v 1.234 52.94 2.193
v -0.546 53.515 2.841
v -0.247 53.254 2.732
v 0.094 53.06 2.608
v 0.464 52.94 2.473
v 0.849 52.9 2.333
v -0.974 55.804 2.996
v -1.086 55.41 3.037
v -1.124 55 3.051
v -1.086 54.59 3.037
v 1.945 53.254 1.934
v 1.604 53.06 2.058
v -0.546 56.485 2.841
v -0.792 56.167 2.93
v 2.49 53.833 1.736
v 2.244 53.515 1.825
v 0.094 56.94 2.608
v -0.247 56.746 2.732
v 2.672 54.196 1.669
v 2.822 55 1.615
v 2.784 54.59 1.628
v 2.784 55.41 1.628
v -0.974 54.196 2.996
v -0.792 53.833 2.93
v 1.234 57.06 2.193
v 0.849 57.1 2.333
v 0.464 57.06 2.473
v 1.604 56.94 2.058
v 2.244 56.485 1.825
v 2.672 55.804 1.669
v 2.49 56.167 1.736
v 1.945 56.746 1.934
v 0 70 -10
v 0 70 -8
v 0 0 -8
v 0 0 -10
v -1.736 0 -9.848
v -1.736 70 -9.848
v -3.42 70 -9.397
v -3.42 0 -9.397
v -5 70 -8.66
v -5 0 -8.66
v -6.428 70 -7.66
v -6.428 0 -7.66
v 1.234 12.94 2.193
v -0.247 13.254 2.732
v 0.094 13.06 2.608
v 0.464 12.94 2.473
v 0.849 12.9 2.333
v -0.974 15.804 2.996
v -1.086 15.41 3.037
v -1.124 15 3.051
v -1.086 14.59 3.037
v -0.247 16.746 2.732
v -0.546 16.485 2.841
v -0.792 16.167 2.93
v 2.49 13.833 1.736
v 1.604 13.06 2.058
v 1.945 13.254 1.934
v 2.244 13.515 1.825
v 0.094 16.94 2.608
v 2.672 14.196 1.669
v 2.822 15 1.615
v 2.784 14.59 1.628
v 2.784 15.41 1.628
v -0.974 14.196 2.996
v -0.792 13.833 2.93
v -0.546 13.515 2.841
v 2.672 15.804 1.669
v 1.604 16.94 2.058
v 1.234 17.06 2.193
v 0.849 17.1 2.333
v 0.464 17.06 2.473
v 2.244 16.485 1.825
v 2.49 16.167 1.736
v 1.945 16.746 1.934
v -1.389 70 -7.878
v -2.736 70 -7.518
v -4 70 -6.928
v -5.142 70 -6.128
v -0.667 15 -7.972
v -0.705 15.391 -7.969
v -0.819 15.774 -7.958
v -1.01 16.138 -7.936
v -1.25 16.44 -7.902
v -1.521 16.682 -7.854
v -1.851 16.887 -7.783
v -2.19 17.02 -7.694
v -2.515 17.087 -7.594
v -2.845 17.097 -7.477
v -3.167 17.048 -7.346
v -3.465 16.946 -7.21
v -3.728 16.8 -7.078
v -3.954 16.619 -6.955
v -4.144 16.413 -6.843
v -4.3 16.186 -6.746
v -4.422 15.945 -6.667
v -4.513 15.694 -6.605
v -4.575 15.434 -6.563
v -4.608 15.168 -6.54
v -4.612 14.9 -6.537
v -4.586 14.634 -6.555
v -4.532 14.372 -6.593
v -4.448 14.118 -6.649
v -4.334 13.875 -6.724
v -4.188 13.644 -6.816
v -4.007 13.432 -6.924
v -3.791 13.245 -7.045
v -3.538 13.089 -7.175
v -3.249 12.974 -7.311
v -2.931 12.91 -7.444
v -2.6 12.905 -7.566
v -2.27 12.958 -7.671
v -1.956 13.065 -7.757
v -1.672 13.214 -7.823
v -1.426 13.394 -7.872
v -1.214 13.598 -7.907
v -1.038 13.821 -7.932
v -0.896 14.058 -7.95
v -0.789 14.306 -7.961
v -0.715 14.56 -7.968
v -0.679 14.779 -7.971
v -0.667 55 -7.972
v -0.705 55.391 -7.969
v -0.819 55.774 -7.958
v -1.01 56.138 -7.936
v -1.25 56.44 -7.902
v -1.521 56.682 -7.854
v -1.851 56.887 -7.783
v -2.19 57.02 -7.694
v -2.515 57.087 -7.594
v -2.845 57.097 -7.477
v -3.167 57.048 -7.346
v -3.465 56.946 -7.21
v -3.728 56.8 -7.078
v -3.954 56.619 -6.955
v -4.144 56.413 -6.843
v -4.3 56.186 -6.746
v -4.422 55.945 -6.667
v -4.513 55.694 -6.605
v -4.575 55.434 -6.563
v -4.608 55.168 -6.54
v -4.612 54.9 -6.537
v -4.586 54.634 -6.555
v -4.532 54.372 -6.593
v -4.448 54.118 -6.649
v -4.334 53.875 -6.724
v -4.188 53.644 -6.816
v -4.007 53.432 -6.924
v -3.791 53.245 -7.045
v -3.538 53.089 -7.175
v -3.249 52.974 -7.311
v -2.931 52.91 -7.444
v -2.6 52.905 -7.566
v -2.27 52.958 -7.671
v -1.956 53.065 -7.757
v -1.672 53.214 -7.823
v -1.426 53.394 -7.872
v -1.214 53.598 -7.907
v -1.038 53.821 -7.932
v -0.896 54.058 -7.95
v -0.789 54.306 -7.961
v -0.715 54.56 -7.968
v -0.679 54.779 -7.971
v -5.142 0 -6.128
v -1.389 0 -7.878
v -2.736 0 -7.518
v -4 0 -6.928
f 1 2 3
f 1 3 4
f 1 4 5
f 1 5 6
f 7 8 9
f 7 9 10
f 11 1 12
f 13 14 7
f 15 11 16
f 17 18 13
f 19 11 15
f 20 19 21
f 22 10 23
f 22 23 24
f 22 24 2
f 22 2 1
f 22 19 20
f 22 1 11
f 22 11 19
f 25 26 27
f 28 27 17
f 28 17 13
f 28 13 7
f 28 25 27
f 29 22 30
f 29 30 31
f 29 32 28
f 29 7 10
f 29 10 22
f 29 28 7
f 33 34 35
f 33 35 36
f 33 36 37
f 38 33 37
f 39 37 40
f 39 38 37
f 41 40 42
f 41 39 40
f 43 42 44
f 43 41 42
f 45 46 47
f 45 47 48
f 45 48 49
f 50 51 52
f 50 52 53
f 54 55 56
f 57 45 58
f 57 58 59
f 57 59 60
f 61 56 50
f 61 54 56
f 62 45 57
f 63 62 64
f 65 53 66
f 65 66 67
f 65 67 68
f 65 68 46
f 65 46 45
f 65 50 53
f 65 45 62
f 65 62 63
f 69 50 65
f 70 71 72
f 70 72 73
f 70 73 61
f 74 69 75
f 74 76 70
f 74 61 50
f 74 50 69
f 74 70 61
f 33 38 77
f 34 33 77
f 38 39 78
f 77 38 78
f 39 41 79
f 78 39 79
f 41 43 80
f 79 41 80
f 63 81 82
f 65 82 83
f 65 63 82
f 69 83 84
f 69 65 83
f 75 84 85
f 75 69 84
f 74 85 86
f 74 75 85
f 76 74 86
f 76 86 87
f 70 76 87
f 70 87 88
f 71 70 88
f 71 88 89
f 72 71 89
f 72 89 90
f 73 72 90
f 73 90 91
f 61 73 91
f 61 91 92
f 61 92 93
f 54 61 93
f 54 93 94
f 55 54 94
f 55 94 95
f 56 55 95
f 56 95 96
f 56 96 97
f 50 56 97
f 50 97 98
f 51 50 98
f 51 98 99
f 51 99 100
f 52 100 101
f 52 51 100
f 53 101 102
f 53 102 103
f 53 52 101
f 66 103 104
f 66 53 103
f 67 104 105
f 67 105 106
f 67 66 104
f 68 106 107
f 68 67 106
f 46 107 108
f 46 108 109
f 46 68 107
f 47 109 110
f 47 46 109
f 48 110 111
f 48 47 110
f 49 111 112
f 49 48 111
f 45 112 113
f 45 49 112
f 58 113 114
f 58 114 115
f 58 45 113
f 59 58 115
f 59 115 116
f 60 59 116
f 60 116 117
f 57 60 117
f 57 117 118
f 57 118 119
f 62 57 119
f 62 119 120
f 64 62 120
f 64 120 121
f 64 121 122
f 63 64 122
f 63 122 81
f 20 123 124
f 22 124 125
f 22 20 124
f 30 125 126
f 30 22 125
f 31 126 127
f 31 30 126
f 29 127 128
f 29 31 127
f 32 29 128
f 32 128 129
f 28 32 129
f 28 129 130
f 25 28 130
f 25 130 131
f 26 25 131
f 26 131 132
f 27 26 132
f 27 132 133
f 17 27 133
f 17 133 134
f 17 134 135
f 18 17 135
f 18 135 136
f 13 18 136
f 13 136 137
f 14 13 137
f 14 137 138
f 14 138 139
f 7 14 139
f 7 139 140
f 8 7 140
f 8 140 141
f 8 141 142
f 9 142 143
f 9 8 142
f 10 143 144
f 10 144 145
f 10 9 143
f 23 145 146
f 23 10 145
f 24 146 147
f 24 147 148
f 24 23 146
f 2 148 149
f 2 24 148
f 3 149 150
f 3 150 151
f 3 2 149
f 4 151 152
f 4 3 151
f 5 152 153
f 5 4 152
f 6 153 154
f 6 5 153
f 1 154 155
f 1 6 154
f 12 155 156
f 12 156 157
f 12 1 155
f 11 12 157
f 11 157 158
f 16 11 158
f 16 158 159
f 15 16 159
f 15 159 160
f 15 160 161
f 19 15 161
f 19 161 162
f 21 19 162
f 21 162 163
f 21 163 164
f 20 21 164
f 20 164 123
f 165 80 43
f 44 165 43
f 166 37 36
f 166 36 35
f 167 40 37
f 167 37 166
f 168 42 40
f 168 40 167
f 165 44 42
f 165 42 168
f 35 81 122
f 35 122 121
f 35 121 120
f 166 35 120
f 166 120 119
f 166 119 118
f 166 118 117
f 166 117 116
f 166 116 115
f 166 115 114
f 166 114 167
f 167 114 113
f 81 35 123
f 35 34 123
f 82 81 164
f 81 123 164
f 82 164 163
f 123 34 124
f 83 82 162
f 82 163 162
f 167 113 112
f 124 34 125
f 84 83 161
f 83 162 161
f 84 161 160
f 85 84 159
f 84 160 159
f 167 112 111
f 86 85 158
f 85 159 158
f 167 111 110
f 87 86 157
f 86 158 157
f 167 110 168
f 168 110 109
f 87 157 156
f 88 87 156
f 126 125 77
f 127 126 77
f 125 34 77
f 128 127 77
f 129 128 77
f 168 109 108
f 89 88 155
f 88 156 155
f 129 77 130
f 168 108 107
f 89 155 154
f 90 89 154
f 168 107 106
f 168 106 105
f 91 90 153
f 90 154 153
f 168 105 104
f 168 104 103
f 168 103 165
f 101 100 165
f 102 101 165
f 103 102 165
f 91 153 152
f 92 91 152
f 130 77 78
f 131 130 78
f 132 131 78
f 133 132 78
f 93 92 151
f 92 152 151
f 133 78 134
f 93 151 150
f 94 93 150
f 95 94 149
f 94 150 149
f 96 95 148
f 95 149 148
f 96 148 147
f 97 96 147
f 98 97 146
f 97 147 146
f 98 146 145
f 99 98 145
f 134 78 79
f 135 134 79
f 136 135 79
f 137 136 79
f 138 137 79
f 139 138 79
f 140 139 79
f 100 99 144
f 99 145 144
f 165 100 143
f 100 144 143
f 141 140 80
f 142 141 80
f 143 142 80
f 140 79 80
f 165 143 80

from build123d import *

# Parameters (mm, degrees)
SKETCH1_W                = 10
SKETCH1_H                = 70
REVOLVE1_ANGLE           = 40
CUT_EXTRUDE1_DEPTH       = 72.002236522
BOSS_EXTRUDE1_REACH      = 73.45
BOSS_EXTRUDE1_END_RADIUS = 8
SKETCH4_R                = 2.1


with BuildPart() as part:
    # Sketch1 → Revolve1 (revolve)
    with BuildSketch(Plane(origin=(0, 0, 0), x_dir=(0, 0, -1), z_dir=(1, 0, 0))):
        with Locations((5, 35)):
            Rectangle(SKETCH1_W, SKETCH1_H)
    revolve(axis=Axis((0, 0, 0), (0, 1, 0)), revolution_arc=REVOLVE1_ANGLE)

    # Sketch2 → Cut-Extrude1 (cut, through all)
    with BuildSketch(Plane(origin=(0, 70, 0), x_dir=(1, 0, 0), z_dir=(0, 1, 0))):
        with BuildLine():
            Line((-5.142300877, 6.128355545), (0, 0))
            Line((0, 0), (0, 8))
            ThreePointArc((0, 8), (-2.736161147, 7.517540966), (-5.142300877, 6.128355545))
        make_face()
    extrude(amount=-CUT_EXTRUDE1_DEPTH, mode=Mode.SUBTRACT)

    # Boss-Extrude1: up to this cylinder (the profile starts inside it)
    boss_extrude1_end = Plane(origin=(0, 35, 0), z_dir=(0, 1, 0)) * Cylinder(BOSS_EXTRUDE1_END_RADIUS, 203.9, mode=Mode.PRIVATE)
    # Sketch4 → Boss-Extrude1 (add, up to the surface)
    with BuildSketch(Plane(origin=(0.849050995, 0, 2.332748435), x_dir=(0.9396926207859081, 0, -0.34202014332566977), z_dir=(0.34202014332566977, 0, 0.9396926207859081)), mode=Mode.PRIVATE) as boss_extrude1_sk1:
        with Locations((0, 55)):
            Circle(SKETCH4_R)
    boss_extrude1_tool1 = extrude(boss_extrude1_sk1.sketch, amount=-BOSS_EXTRUDE1_REACH, mode=Mode.PRIVATE) & boss_extrude1_end
    add(boss_extrude1_tool1.solids().sort_by_distance((0.849051, 55, 2.332748))[0])
    # Sketch4 → Boss-Extrude1 (add, up to the surface)
    with BuildSketch(Plane(origin=(0.849050995, 0, 2.332748435), x_dir=(0.9396926207859081, 0, -0.34202014332566977), z_dir=(0.34202014332566977, 0, 0.9396926207859081)), mode=Mode.PRIVATE) as boss_extrude1_sk2:
        with Locations((0, 15)):
            Circle(SKETCH4_R)
    boss_extrude1_tool2 = extrude(boss_extrude1_sk2.sketch, amount=-BOSS_EXTRUDE1_REACH, mode=Mode.PRIVATE) & boss_extrude1_end
    add(boss_extrude1_tool2.solids().sort_by_distance((0.849051, 15, 2.332748))[0])


solid = part.part
